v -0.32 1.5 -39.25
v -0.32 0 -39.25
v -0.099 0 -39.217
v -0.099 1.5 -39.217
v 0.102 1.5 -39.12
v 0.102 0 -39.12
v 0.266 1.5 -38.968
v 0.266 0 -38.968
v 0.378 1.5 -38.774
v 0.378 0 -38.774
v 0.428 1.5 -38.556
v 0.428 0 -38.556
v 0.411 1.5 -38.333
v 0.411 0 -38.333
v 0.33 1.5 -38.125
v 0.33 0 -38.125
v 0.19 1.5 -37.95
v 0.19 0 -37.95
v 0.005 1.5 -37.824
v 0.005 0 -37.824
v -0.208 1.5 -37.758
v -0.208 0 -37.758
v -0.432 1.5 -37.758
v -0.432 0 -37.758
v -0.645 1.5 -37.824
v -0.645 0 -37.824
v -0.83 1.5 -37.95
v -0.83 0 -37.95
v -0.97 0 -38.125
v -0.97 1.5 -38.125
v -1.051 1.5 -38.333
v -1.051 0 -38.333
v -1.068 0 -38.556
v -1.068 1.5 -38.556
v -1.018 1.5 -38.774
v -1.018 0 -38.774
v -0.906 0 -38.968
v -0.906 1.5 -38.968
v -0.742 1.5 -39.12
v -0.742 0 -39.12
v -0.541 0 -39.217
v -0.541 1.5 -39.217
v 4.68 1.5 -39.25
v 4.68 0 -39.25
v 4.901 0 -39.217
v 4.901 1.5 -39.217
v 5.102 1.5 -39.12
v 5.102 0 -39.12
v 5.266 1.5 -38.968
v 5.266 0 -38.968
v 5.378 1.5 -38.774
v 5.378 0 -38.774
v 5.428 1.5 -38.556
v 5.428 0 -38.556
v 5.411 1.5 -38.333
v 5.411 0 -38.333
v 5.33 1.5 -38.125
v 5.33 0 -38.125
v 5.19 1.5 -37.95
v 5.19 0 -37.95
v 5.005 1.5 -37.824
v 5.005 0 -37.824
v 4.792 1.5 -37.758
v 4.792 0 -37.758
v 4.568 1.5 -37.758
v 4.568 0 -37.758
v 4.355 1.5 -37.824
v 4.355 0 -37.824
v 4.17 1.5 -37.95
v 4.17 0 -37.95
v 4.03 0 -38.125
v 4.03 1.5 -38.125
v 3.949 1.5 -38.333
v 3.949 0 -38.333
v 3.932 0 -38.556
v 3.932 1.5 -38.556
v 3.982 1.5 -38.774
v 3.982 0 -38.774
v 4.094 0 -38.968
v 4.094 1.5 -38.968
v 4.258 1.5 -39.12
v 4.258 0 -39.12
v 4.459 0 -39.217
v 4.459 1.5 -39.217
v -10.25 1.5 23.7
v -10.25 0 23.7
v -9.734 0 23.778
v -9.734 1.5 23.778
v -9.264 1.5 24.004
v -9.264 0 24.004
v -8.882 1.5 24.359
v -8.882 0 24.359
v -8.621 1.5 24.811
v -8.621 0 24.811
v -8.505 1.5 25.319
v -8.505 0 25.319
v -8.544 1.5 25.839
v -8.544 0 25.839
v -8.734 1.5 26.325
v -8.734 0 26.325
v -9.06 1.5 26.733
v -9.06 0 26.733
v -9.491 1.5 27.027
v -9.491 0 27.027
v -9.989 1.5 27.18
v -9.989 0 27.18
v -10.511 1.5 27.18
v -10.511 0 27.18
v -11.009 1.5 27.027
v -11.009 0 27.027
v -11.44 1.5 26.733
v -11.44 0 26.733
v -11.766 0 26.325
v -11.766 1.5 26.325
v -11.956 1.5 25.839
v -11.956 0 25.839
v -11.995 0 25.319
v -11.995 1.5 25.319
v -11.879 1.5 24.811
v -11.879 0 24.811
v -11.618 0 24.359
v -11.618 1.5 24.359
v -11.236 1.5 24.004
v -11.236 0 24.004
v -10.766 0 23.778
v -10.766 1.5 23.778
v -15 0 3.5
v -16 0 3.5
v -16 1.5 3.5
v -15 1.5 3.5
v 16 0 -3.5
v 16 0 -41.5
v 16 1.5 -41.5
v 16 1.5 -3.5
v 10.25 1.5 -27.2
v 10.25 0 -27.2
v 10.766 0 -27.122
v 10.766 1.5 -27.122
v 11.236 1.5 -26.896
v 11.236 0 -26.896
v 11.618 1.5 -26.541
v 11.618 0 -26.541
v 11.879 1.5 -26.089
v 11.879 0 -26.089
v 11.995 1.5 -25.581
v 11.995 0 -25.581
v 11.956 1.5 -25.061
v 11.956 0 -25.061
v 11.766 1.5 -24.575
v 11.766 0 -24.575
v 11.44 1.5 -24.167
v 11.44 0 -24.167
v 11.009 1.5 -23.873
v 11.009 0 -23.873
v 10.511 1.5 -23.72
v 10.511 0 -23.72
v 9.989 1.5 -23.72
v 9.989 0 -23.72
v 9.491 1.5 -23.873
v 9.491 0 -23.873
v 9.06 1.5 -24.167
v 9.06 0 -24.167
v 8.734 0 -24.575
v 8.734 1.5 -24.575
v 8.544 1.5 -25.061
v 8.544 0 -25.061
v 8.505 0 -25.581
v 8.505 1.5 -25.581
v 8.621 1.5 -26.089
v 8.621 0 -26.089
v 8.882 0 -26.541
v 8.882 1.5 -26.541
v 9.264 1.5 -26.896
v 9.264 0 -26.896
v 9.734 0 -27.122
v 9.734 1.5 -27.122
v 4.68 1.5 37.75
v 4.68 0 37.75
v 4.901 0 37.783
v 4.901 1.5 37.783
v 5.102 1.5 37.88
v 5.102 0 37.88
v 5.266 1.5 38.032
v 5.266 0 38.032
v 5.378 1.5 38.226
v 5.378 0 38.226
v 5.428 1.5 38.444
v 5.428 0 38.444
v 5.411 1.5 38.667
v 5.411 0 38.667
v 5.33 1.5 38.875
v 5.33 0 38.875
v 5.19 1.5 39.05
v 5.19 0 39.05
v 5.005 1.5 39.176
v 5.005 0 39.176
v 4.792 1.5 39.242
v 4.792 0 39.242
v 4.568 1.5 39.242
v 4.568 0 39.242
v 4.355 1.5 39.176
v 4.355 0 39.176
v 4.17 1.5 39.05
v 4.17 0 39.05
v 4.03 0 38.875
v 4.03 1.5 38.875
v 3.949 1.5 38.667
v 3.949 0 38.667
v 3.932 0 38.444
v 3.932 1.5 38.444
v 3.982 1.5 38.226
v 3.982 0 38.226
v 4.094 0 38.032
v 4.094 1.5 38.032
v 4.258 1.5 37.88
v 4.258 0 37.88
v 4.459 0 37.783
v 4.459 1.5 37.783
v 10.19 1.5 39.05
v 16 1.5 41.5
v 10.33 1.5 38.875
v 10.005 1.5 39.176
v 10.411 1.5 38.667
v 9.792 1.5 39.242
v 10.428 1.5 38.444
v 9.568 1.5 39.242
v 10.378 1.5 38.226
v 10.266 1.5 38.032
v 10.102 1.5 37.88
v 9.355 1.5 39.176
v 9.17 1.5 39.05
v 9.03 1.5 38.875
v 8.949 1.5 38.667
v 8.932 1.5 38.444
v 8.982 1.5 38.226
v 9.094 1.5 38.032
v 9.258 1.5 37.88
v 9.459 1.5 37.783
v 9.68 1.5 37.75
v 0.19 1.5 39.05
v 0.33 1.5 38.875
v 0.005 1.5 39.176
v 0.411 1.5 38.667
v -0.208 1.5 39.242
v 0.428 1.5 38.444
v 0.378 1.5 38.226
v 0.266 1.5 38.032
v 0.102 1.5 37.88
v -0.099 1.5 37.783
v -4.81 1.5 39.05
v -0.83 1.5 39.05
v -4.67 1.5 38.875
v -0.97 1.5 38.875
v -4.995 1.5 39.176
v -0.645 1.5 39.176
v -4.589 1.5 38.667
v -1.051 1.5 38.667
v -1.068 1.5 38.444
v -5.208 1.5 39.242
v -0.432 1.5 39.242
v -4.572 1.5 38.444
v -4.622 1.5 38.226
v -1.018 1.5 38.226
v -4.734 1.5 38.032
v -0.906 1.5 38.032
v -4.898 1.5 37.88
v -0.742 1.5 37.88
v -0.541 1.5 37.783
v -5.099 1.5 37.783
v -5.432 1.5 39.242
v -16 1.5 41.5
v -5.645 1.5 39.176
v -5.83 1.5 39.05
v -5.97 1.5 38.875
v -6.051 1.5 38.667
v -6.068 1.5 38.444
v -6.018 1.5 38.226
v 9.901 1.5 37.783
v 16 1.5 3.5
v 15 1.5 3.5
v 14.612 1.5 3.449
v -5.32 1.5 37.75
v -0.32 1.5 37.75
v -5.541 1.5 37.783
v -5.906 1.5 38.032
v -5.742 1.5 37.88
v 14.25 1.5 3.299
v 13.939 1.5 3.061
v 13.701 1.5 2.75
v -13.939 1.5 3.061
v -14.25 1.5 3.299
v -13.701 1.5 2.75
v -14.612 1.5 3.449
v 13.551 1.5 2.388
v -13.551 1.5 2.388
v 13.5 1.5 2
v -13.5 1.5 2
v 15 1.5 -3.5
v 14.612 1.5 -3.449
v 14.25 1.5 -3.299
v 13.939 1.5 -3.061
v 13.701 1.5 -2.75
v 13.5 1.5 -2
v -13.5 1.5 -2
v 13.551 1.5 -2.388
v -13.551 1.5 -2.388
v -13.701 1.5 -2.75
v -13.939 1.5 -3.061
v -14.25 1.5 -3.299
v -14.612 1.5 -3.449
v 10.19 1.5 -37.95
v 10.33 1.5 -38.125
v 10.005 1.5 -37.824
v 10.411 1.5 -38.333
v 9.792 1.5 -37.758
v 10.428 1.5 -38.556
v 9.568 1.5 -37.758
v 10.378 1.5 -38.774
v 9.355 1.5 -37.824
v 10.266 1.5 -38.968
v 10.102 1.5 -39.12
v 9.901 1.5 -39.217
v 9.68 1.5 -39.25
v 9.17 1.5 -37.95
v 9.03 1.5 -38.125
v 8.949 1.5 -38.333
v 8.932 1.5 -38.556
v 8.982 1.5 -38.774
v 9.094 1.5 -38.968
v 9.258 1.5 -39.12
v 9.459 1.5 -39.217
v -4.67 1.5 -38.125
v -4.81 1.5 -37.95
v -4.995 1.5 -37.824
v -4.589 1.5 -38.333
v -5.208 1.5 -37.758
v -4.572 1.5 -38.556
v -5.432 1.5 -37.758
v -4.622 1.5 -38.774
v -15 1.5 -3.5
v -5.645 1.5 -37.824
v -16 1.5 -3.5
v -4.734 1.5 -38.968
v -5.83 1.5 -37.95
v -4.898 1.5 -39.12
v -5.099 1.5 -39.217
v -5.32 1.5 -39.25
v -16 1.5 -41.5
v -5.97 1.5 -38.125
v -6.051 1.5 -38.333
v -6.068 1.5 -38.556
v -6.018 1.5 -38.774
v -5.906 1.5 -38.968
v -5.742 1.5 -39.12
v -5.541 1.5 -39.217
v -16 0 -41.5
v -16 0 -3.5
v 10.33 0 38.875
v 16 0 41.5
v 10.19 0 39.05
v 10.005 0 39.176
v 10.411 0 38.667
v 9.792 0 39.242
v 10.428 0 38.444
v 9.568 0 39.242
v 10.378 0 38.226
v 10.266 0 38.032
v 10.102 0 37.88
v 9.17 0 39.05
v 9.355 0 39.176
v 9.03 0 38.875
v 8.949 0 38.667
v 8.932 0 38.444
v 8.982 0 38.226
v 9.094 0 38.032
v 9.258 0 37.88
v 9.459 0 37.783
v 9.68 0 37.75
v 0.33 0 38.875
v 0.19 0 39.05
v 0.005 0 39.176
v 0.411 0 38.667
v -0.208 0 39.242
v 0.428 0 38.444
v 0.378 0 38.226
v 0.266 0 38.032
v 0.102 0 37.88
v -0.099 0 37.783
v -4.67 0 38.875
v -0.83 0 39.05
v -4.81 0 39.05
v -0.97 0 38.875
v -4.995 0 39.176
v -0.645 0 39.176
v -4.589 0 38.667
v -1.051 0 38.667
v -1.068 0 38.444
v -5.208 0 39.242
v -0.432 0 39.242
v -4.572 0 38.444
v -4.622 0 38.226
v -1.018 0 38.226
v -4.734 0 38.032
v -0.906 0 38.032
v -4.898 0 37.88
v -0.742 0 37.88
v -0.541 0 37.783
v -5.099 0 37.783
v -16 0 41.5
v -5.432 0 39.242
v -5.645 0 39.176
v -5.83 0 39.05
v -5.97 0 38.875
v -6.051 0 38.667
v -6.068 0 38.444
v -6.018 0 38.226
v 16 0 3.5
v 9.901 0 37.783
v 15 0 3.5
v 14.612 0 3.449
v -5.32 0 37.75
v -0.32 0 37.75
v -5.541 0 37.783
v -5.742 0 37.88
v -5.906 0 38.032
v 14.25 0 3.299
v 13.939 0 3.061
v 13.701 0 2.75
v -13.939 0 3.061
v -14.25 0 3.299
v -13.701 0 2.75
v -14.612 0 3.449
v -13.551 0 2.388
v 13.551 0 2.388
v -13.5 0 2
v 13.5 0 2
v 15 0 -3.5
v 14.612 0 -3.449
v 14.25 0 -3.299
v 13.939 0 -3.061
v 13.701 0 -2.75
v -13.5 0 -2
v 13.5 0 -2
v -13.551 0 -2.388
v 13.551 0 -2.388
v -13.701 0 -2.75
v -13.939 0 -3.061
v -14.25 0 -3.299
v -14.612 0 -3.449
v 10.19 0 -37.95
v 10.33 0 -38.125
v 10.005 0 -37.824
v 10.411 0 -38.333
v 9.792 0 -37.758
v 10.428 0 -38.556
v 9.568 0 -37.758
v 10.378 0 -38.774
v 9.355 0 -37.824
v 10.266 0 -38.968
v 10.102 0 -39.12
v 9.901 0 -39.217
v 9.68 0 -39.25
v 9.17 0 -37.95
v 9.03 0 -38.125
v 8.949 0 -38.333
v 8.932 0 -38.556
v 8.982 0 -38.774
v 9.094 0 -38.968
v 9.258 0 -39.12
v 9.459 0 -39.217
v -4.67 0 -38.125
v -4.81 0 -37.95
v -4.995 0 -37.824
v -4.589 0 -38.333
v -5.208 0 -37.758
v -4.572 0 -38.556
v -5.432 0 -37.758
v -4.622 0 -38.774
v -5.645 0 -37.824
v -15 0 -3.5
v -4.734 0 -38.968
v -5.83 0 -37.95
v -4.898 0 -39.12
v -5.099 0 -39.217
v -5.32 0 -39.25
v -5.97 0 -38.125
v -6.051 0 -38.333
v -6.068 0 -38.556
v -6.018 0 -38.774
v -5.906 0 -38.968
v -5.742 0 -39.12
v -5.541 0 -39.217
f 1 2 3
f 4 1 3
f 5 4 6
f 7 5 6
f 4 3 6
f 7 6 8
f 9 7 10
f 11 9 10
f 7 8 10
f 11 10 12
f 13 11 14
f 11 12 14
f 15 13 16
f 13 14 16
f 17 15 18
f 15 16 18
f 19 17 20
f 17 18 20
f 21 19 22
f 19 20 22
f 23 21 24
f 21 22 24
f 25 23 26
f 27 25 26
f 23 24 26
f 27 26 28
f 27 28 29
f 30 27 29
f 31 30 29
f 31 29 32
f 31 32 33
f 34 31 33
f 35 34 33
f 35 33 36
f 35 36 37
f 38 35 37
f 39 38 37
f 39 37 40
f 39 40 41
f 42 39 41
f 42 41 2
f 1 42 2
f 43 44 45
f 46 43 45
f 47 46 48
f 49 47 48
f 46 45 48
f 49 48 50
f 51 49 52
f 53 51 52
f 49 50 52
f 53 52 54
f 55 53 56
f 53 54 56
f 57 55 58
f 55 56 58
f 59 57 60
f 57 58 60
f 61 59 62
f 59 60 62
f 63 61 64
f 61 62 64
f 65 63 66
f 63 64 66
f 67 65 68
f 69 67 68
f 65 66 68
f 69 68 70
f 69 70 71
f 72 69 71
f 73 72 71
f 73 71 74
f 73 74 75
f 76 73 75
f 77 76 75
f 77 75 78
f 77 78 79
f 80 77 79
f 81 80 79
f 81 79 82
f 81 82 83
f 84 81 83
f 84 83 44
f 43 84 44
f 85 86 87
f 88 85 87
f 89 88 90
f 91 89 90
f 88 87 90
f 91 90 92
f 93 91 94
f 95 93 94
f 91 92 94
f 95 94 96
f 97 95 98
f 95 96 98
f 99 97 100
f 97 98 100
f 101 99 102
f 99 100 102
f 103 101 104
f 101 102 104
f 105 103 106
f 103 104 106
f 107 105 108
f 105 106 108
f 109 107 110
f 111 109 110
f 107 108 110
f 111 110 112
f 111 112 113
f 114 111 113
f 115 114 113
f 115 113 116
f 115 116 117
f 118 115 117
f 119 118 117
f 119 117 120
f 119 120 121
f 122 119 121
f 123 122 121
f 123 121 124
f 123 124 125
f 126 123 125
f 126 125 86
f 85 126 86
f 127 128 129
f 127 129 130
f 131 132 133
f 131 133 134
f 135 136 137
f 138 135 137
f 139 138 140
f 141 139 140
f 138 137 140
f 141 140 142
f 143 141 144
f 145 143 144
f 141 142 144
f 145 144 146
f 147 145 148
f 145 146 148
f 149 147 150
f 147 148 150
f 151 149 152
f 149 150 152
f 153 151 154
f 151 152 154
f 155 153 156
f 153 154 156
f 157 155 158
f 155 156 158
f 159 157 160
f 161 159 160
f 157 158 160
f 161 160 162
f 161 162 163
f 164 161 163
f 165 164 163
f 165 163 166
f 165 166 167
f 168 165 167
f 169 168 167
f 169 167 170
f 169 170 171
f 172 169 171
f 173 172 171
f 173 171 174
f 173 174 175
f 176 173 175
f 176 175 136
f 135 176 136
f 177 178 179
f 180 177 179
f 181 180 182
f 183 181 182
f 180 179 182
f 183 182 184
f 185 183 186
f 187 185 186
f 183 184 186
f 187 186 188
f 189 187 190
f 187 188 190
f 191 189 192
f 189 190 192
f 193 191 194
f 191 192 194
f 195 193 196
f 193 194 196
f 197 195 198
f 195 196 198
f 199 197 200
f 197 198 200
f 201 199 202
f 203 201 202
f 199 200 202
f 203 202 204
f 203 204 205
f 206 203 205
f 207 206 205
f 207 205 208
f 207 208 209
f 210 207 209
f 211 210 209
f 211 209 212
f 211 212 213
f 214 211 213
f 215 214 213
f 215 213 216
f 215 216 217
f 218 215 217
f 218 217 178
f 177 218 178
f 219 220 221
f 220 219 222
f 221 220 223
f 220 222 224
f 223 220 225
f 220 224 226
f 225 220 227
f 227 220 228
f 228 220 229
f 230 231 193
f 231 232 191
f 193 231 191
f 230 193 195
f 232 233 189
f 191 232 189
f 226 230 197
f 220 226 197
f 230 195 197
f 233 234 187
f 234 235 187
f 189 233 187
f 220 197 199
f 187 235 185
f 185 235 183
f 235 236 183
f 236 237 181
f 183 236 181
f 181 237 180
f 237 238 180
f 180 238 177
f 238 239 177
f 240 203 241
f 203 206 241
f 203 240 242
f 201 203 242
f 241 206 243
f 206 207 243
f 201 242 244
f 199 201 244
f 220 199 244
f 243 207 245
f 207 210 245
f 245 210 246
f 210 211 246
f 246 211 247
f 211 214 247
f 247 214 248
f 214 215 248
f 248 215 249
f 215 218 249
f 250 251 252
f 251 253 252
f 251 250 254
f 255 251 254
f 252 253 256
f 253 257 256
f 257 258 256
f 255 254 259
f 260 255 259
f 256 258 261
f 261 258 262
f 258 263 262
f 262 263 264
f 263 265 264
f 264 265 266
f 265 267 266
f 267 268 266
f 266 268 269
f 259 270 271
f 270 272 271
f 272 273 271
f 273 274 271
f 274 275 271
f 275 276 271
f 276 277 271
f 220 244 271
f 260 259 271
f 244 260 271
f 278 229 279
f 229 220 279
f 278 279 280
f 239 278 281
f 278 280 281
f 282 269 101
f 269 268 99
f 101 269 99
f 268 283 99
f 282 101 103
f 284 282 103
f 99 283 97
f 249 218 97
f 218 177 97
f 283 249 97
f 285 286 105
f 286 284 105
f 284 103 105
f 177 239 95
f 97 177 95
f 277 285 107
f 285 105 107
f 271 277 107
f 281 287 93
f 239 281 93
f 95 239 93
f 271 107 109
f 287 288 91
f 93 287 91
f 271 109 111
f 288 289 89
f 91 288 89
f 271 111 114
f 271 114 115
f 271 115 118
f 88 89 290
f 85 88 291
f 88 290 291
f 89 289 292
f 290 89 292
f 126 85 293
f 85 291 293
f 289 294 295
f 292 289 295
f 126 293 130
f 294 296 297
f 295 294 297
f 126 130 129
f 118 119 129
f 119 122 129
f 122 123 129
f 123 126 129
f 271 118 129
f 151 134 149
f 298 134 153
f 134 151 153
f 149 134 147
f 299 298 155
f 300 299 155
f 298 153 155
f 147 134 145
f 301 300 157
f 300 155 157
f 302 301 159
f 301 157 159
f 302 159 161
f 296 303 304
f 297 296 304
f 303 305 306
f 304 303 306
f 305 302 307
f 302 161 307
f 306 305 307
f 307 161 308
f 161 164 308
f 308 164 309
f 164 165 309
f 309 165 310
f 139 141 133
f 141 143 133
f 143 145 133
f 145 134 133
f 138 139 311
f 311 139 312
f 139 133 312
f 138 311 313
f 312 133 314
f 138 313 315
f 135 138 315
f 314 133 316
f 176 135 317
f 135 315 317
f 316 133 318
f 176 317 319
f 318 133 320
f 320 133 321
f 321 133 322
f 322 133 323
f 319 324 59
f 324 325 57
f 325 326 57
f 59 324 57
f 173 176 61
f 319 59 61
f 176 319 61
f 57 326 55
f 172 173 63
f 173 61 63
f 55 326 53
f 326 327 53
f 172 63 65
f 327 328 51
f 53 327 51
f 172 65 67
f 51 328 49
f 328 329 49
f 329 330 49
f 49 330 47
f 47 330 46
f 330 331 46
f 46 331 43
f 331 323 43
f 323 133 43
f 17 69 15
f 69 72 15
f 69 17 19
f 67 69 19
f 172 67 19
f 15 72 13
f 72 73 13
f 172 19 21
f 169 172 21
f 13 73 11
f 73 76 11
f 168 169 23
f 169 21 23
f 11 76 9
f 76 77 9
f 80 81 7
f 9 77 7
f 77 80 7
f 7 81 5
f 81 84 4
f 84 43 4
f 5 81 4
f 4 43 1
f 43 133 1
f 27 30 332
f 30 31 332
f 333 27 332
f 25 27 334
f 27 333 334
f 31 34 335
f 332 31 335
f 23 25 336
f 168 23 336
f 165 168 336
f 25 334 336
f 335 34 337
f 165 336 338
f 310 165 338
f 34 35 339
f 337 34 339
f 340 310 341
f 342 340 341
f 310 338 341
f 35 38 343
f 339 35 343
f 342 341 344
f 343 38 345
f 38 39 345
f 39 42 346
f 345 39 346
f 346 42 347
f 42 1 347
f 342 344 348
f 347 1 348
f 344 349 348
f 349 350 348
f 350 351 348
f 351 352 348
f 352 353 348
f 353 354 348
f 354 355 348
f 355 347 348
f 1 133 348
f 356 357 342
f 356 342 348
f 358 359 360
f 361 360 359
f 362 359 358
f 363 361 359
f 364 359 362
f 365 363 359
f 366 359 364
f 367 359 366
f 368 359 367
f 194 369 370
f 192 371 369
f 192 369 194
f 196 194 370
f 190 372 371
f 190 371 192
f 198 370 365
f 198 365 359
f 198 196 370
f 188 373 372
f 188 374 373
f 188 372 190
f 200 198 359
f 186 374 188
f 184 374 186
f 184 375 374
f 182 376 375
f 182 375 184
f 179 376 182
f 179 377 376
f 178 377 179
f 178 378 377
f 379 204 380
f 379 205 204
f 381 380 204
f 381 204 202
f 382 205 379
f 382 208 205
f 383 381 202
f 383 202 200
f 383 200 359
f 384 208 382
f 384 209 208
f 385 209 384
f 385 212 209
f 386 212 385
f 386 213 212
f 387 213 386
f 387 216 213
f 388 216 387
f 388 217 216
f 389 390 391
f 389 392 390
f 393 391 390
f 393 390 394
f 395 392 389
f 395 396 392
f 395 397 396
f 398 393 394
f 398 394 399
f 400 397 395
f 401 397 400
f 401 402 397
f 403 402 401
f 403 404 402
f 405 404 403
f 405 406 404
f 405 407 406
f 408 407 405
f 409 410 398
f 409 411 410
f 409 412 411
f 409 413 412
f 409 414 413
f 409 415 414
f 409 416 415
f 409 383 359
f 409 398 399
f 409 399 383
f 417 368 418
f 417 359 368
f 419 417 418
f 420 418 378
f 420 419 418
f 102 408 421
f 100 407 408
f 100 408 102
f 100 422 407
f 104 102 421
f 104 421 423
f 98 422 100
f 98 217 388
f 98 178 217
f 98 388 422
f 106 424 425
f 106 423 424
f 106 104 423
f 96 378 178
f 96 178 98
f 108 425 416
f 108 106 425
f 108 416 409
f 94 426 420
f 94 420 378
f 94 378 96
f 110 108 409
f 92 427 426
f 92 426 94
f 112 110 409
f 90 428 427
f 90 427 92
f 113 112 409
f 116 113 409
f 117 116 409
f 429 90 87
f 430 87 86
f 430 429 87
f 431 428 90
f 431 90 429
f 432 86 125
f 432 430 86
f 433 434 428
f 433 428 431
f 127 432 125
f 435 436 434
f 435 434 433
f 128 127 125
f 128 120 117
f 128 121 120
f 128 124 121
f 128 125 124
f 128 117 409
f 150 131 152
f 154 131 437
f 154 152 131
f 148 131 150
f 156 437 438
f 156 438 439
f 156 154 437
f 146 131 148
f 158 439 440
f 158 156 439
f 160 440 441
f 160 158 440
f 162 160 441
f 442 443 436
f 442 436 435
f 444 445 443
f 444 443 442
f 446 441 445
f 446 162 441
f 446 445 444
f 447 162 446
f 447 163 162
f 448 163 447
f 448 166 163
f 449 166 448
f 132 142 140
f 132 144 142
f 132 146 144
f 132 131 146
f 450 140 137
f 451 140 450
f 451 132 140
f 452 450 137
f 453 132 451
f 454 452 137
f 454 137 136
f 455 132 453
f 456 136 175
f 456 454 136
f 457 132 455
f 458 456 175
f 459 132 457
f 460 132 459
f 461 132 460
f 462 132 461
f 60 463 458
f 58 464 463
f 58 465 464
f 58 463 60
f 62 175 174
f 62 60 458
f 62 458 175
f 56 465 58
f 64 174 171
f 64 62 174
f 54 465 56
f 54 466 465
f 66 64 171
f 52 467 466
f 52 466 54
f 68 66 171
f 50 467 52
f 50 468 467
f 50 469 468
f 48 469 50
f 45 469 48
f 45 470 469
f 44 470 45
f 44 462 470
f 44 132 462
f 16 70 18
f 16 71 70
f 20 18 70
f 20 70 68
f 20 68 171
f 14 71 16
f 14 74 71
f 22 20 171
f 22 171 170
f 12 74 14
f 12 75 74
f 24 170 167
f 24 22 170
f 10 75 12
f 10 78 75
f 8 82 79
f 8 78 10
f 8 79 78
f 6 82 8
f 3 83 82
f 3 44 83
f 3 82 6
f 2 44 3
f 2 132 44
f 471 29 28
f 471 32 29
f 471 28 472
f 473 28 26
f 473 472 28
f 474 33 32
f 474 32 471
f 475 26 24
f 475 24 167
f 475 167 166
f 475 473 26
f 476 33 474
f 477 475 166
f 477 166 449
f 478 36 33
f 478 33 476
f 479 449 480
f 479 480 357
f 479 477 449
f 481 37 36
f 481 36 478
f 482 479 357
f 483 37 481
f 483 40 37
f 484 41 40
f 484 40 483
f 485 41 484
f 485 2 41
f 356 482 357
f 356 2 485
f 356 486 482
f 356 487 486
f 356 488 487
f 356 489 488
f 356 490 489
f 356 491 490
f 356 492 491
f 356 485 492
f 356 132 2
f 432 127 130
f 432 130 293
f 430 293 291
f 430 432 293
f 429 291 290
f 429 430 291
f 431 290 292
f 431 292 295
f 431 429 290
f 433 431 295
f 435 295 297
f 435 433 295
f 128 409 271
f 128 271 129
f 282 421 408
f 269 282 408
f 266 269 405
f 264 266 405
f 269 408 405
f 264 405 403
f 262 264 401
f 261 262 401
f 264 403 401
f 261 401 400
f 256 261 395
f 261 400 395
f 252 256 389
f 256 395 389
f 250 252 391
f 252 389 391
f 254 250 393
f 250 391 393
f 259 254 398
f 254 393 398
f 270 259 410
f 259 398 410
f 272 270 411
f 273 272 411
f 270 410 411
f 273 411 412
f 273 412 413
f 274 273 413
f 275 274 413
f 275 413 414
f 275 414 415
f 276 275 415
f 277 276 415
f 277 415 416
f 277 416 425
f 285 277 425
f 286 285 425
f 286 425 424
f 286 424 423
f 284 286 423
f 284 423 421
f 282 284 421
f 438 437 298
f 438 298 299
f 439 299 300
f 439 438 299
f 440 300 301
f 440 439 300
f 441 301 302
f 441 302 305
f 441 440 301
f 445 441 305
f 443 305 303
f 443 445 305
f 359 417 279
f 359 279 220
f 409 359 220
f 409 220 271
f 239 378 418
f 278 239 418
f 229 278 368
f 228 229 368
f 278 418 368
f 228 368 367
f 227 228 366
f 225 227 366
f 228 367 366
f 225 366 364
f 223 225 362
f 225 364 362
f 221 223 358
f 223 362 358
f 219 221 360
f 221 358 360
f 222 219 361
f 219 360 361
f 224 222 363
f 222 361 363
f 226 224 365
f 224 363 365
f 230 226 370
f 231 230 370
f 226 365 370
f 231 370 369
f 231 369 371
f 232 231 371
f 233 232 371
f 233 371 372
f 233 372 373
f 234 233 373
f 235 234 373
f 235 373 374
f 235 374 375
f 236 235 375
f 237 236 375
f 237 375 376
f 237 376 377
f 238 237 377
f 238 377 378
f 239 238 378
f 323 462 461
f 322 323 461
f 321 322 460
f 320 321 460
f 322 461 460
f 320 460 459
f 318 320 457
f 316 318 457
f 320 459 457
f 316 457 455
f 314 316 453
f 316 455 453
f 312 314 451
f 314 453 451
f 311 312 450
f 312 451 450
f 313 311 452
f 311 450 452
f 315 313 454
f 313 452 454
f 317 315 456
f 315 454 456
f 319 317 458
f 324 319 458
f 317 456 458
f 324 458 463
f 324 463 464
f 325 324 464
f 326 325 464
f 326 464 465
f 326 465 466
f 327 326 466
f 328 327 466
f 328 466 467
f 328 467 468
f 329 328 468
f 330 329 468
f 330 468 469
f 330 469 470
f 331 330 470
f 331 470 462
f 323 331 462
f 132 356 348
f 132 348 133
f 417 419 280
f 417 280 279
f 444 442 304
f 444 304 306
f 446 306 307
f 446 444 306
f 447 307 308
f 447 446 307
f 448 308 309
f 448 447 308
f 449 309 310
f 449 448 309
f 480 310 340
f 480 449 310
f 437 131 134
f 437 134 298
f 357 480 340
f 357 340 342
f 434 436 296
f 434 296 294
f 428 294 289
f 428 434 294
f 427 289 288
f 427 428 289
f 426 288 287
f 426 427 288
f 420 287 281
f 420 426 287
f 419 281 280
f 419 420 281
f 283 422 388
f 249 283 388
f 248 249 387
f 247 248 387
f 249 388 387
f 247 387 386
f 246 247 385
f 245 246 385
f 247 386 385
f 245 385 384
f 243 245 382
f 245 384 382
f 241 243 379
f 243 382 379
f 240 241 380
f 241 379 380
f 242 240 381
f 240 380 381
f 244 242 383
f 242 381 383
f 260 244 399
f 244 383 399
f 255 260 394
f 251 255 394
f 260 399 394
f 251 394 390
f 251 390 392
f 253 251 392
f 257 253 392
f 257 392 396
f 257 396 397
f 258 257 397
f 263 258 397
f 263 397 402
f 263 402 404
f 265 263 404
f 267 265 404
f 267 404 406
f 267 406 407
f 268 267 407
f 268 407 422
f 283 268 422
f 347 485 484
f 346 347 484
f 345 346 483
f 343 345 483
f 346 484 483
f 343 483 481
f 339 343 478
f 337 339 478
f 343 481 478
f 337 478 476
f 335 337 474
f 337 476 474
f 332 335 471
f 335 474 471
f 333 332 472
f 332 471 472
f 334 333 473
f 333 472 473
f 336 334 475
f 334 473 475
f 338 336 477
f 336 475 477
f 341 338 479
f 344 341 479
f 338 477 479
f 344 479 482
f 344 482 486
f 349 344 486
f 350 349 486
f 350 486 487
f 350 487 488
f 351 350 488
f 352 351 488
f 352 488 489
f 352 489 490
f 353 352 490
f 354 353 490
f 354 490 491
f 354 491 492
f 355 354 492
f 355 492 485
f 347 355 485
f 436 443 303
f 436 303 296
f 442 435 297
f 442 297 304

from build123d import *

# Parameters (mm, degrees)
EXTRUDE_1_DEPTH        = 1.5
HOLE_WIZARD_2_D        = 3.5
HOLE_WIZARD_4_D        = 1.5
PATTERN_LINEAR_2_COUNT = 4
PATTERN_LINEAR_2_PITCH = 5


with BuildPart() as part:
    # Эскиз1 → Вытянуть1 (new body)
    with BuildSketch(Plane(origin=(0, 0, 0), x_dir=(1, 0, 0), z_dir=(0, 1, 0))):
        with BuildLine():
            Line((-16, 41.5), (16, 41.5))
            Line((16, 41.5), (16, 3.5))
            Line((16, 3.5), (15, 3.5))
            ThreePointArc((15, 3.5), (13.939339828, 3.060660172), (13.5, 2))
            Line((13.5, 2), (13.5, -2))
            ThreePointArc((13.5, -2), (13.939339828, -3.060660172), (15, -3.5))
            Line((15, -3.5), (16, -3.5))
            Line((16, -3.5), (16, -41.5))
            Line((16, -41.5), (-16, -41.5))
            Line((-16, -41.5), (-16, -3.5))
            Line((-16, -3.5), (-15, -3.5))
            ThreePointArc((-15, -3.5), (-13.939339828, -3.060660172), (-13.5, -2))
            Line((-13.5, -2), (-13.5, 2))
            ThreePointArc((-13.5, 2), (-13.939339828, 3.060660172), (-15, 3.5))
            Line((-15, 3.5), (-16, 3.5))
            Line((-16, 3.5), (-16, 41.5))
        make_face()
    extrude(amount=EXTRUDE_1_DEPTH)

    # Отверстие2 (through all)
    with Locations(Plane(origin=(10.25, 1.5, -25.45), x_dir=(0, 0, 1), z_dir=(0, 1, 0))):
        with Locations((0, 0), (50.9, -20.5)):
            Hole(HOLE_WIZARD_2_D / 2)

    # Отверстие4 (through all)
    with Locations(Plane(origin=(9.68, 1.5, -38.5), x_dir=(0, 0, 1), z_dir=(0, 1, 0))):
        with Locations((0, 0), (77, 0)):
            hole_wizard_4 = Hole(HOLE_WIZARD_4_D / 2)

    # Линейный массив2: Отверстие4 ×4
    with Locations(*[(-i * PATTERN_LINEAR_2_PITCH, 0, 0) for i in range(1, PATTERN_LINEAR_2_COUNT)]):
        add(hole_wizard_4, mode=Mode.SUBTRACT)


solid = part.part
